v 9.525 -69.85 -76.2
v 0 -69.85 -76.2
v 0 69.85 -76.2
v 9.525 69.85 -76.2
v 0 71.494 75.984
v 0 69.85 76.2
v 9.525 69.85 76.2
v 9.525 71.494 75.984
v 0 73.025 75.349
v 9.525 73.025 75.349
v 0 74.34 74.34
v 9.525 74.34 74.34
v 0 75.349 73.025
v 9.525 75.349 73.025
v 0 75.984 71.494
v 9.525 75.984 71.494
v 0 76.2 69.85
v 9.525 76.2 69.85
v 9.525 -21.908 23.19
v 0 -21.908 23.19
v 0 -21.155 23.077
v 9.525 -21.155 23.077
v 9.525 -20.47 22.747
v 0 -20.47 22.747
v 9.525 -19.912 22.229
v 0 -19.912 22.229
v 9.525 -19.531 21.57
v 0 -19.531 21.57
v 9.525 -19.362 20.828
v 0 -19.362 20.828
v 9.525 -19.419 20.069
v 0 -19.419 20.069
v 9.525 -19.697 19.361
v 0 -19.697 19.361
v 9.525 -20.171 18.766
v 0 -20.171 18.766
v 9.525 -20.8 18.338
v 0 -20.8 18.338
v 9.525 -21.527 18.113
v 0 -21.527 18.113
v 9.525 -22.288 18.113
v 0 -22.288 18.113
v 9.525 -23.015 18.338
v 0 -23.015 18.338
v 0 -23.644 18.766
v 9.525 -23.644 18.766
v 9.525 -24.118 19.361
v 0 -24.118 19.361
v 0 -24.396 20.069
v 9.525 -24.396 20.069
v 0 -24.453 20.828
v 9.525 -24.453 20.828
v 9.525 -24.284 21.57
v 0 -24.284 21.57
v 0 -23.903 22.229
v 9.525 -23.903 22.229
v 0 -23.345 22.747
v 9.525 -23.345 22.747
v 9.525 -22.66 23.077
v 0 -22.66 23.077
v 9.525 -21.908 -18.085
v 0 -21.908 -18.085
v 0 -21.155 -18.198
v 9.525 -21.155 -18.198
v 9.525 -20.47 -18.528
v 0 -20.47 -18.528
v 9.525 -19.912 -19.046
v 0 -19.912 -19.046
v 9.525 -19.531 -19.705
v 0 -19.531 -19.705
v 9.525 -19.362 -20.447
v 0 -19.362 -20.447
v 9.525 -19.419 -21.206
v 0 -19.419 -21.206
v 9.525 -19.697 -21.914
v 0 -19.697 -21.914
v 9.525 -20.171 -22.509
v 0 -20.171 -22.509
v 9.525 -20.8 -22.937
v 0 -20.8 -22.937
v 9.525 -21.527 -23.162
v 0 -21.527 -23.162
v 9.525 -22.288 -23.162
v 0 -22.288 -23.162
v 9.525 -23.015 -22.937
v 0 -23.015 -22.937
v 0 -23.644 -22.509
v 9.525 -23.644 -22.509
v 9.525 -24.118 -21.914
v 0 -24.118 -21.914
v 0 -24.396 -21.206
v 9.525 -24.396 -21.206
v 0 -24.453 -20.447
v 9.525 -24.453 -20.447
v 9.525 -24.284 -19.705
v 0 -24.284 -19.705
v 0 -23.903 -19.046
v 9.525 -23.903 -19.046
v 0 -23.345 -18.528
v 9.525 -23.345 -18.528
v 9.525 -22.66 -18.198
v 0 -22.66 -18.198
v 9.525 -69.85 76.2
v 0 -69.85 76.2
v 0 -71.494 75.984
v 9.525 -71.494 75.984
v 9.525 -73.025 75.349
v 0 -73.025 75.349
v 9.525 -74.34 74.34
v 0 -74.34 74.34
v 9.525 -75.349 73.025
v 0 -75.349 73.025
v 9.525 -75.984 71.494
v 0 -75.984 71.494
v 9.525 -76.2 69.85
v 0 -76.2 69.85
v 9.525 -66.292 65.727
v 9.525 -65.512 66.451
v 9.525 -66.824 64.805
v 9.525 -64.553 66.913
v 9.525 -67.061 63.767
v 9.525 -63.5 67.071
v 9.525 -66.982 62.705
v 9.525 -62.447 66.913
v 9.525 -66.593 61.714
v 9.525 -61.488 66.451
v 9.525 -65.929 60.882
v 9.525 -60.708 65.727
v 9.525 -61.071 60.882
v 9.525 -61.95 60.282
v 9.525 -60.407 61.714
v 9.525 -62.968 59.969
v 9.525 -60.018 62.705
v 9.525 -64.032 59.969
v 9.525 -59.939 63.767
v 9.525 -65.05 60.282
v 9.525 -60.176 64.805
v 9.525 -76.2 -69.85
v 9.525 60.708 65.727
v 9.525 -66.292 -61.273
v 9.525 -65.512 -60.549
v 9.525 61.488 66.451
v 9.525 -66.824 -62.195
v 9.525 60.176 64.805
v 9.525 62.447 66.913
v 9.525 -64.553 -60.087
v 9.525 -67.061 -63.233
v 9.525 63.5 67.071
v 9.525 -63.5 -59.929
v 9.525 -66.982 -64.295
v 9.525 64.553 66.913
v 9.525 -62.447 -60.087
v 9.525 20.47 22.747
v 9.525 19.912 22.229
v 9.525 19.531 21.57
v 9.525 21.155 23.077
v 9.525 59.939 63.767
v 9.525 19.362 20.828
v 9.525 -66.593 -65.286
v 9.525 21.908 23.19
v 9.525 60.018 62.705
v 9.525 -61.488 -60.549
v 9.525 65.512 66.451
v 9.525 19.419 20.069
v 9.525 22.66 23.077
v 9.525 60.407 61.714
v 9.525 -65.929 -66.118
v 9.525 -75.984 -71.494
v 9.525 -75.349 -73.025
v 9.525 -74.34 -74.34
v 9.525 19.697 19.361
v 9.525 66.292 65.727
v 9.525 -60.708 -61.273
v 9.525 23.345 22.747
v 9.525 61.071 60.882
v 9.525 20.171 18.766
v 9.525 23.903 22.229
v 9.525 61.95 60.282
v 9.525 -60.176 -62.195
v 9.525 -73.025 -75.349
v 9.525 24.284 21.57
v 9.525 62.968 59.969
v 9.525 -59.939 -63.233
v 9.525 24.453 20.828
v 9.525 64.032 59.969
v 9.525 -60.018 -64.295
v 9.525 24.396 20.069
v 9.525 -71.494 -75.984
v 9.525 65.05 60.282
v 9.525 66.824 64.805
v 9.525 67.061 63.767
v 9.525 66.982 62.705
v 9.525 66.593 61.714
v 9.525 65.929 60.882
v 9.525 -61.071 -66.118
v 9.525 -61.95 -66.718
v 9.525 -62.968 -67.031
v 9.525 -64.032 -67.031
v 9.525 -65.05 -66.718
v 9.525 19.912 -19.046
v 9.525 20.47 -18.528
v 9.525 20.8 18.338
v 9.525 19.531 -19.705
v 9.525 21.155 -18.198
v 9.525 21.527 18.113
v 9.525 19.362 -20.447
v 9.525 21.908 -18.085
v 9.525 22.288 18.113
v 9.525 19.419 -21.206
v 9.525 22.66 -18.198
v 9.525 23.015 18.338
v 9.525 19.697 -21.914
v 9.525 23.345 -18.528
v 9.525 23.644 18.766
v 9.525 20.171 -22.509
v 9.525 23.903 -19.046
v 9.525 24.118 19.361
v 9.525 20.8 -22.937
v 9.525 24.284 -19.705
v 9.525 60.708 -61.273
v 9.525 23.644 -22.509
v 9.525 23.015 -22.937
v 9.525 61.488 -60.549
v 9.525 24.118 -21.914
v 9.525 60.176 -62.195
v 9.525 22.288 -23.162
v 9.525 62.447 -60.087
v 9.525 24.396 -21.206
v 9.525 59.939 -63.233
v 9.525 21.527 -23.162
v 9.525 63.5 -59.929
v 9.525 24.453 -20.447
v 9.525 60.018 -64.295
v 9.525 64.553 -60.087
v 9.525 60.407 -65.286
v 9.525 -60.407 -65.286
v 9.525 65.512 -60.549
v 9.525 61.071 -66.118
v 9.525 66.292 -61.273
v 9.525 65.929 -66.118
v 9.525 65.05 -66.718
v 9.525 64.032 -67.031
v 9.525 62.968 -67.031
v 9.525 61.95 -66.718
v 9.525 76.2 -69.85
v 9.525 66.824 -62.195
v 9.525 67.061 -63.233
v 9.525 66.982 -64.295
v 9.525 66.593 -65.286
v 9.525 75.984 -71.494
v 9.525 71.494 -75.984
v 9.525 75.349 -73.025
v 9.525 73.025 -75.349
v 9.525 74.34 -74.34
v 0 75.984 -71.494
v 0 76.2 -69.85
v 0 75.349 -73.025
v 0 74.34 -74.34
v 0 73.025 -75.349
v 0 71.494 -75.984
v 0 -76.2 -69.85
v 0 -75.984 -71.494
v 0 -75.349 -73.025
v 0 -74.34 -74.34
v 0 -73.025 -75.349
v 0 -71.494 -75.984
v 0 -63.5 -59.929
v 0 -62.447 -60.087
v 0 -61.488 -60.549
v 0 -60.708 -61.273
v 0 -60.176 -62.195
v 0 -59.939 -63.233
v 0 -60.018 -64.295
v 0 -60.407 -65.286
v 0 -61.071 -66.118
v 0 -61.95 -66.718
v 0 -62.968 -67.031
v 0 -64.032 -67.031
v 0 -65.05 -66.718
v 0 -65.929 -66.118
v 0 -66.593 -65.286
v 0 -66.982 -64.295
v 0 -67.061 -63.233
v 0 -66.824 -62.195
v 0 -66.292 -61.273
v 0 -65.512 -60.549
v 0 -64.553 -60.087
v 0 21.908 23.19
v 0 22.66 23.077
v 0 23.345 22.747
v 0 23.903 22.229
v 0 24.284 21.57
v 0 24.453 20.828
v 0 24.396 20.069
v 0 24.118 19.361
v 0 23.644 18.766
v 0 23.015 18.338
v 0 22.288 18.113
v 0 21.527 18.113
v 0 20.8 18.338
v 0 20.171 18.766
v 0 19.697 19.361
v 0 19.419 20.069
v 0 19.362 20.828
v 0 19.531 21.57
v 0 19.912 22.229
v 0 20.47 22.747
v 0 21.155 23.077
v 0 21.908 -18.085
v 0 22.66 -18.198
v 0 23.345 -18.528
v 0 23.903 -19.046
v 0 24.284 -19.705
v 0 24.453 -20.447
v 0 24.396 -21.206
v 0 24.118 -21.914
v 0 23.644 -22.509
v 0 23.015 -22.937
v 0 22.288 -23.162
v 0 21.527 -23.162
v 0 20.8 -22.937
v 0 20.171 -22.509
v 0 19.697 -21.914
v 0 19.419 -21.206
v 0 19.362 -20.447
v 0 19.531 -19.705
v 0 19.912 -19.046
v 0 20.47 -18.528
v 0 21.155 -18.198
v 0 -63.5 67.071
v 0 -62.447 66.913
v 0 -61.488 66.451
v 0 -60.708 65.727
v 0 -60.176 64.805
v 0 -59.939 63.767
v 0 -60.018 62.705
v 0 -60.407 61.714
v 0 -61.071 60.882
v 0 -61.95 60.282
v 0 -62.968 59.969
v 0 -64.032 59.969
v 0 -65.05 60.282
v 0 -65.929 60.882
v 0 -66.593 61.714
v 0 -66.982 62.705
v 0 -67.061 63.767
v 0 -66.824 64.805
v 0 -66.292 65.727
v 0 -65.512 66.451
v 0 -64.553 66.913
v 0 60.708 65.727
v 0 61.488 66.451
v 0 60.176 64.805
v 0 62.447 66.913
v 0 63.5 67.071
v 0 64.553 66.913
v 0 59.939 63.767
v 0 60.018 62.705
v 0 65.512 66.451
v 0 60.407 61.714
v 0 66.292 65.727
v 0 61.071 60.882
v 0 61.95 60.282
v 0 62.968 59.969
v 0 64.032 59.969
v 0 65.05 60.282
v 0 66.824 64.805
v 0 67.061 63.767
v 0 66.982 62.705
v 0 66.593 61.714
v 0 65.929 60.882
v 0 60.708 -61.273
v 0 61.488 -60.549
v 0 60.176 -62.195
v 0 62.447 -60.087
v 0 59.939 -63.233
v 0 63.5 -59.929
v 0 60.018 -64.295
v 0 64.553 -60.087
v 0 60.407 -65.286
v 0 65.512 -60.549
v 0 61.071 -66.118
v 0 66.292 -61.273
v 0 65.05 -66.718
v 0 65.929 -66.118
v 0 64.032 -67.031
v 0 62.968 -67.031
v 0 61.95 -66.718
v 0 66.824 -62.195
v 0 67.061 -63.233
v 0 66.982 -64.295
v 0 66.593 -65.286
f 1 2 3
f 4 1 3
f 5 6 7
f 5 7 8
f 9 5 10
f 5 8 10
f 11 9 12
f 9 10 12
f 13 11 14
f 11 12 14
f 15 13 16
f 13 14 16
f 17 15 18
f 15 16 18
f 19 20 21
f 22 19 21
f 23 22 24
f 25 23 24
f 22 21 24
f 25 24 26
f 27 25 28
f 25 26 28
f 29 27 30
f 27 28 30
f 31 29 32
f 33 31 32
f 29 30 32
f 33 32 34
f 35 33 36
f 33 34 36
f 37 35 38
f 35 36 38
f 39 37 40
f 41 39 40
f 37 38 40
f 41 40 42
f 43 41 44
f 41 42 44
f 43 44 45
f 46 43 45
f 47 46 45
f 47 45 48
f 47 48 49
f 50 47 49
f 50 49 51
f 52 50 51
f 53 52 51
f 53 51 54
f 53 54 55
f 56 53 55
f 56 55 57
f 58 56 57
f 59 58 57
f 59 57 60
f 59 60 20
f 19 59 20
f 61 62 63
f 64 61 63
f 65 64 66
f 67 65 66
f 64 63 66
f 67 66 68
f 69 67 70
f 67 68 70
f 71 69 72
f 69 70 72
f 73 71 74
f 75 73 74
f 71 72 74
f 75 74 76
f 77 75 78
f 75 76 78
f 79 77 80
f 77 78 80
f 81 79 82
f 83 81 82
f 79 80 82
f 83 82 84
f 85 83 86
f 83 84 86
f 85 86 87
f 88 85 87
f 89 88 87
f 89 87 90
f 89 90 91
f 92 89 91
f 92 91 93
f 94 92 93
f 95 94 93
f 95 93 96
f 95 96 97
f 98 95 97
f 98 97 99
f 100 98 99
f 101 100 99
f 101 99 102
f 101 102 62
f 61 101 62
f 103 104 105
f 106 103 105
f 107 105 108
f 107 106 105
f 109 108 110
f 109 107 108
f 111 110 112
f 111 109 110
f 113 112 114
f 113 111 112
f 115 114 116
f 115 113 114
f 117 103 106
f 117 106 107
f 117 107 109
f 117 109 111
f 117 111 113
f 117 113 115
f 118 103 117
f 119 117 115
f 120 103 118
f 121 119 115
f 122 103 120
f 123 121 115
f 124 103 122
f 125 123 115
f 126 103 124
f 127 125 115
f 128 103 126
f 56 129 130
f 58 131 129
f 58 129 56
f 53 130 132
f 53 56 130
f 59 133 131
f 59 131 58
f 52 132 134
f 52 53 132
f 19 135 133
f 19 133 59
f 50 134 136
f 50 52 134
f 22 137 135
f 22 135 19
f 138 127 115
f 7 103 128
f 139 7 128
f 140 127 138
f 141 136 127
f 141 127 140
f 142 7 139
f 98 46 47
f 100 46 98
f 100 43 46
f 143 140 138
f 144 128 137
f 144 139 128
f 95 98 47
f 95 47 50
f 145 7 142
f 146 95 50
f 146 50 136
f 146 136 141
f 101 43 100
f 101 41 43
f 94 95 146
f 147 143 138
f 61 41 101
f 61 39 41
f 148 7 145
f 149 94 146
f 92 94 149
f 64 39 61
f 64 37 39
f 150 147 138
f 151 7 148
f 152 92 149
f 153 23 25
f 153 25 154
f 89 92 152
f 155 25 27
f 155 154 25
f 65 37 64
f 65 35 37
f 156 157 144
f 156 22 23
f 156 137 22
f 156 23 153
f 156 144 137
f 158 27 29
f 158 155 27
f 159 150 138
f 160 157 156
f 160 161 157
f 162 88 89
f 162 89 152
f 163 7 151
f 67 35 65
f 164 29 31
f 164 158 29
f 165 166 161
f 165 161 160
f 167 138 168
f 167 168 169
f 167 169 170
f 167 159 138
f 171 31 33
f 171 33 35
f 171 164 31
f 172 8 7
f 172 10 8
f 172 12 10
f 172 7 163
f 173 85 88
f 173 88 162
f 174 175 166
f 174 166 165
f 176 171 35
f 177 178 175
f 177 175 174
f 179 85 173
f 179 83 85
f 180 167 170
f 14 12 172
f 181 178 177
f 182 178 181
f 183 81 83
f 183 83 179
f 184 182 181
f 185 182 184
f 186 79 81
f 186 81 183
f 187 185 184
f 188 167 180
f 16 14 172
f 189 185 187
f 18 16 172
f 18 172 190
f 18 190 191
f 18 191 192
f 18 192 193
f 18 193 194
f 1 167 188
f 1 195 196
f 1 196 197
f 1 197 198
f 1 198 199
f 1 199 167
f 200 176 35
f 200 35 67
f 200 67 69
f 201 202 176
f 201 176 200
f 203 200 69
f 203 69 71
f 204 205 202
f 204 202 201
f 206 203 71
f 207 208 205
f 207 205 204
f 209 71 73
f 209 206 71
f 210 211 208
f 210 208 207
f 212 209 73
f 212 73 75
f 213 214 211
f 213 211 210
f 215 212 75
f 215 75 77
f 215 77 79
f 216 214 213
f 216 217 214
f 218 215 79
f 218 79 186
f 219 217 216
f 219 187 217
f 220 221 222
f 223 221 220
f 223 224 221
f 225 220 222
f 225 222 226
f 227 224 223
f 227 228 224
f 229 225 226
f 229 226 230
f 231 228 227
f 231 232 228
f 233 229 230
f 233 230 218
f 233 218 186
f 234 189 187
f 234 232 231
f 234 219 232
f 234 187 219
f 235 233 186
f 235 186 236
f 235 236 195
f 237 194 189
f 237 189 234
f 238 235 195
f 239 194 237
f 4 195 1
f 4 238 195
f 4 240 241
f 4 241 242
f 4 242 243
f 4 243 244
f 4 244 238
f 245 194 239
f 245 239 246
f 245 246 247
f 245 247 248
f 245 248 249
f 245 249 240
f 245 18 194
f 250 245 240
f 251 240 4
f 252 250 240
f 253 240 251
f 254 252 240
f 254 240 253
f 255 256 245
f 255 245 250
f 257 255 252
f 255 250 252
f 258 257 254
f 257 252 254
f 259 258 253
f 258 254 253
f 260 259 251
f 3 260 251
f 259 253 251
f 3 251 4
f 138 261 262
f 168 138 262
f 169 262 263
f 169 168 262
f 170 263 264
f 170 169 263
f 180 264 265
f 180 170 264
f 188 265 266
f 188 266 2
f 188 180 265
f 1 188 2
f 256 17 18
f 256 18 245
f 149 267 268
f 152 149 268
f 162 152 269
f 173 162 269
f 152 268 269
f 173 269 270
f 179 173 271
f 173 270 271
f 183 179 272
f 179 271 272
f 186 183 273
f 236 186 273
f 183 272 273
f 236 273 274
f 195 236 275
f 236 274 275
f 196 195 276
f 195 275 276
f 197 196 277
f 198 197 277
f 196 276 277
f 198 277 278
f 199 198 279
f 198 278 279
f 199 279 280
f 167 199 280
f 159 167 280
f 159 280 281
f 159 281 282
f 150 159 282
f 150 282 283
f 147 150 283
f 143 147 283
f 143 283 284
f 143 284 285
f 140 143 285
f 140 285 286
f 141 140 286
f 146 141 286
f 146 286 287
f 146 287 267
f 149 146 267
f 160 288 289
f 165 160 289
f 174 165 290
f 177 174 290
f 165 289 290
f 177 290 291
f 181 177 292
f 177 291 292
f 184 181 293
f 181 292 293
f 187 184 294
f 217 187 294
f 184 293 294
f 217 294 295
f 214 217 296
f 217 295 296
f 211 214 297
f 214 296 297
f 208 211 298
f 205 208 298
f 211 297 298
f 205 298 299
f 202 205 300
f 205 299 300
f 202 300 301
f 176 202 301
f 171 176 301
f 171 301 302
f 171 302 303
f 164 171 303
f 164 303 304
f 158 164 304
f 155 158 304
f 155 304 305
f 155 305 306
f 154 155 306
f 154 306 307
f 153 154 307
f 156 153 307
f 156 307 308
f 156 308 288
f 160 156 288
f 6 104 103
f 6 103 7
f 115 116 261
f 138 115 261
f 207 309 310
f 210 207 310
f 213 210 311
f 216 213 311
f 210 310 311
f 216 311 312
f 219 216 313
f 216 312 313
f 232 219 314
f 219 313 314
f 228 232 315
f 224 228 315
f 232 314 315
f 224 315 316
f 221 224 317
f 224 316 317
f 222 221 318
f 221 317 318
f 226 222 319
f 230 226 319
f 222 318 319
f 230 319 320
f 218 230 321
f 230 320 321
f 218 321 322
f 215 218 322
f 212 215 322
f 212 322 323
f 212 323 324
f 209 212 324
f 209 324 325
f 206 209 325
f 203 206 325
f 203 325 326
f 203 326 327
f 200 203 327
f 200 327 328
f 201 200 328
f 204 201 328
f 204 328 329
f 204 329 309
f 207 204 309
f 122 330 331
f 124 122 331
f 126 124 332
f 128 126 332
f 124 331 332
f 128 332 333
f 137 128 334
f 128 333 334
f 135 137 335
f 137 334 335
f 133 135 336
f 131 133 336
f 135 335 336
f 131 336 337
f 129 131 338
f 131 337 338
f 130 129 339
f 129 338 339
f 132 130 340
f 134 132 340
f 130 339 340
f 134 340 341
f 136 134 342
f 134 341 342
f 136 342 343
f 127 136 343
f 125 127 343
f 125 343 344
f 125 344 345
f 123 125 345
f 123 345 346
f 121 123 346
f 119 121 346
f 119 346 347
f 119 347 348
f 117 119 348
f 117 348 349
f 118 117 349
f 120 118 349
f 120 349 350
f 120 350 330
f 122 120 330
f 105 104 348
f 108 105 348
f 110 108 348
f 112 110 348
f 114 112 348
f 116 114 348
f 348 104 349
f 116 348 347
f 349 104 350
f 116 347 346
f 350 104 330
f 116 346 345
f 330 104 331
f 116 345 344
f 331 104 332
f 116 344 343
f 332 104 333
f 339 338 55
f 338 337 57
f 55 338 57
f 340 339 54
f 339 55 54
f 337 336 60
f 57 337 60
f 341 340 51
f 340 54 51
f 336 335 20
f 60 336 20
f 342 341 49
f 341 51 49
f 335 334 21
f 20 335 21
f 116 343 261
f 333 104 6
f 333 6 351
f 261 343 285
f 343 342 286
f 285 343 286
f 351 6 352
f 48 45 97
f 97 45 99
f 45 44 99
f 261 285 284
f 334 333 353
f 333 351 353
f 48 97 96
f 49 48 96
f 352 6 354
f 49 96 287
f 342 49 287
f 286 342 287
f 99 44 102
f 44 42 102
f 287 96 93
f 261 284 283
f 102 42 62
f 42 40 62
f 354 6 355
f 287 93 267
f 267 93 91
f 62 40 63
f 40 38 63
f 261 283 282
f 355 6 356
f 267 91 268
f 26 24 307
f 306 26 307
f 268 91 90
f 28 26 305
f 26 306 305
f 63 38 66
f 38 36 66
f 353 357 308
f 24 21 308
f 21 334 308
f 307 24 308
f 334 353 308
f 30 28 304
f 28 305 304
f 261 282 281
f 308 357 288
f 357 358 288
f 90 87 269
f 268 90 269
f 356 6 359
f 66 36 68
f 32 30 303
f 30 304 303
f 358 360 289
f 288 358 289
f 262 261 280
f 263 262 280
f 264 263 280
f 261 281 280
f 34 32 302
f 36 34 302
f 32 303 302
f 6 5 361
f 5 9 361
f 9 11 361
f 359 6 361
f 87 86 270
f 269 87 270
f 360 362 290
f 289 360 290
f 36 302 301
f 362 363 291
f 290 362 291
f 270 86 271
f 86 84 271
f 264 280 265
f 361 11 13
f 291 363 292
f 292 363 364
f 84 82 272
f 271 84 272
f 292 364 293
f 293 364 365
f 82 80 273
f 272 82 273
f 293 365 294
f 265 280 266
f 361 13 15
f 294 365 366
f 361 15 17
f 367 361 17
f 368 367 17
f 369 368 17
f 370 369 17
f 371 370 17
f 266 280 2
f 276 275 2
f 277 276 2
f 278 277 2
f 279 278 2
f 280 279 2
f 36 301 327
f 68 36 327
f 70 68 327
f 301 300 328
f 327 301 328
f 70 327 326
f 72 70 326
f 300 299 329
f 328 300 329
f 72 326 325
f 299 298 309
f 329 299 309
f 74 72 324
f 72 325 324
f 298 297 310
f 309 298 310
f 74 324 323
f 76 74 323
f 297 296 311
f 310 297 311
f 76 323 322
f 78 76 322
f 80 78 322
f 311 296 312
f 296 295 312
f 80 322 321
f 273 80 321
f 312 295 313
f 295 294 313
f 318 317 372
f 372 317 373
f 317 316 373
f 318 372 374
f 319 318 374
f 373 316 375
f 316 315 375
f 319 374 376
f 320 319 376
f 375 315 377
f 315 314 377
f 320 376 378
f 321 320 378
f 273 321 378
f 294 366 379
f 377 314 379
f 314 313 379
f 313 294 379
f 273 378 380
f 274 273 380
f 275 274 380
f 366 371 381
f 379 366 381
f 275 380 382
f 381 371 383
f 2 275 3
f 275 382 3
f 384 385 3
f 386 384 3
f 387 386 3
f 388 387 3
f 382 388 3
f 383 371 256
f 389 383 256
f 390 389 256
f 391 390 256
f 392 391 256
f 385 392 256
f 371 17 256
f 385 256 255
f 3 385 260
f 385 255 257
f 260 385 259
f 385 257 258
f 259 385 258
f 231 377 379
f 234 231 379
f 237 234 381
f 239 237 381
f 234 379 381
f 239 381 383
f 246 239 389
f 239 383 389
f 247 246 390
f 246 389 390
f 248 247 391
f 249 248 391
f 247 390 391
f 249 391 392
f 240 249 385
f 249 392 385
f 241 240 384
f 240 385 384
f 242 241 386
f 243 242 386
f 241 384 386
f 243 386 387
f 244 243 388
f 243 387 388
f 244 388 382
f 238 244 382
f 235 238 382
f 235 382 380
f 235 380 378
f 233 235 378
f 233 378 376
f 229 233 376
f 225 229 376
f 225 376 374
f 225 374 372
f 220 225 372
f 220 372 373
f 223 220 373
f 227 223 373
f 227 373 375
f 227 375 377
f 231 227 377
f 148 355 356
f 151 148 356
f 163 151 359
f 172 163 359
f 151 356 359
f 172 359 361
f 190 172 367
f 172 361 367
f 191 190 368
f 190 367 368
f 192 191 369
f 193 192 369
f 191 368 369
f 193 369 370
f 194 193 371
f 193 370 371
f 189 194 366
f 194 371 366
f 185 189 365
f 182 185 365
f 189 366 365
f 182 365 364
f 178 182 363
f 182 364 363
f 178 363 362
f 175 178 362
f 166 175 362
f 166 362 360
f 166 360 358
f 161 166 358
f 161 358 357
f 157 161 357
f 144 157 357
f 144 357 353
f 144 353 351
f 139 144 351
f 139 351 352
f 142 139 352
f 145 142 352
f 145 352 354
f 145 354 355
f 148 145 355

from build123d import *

# Parameters (mm, degrees)
SKETCH1_W               = 152.4
SKETCH1_H               = 152.4
BOSS_EXTRUDE1_DEPTH     = 9.525
F_1_4_20_TAPPED_HOLE1_D = 5.1054
FILLET1_R               = 6.35
F_1_4_CLEARANCE_HOLE1_D = 7.14248


with BuildPart() as part:
    # Sketch1 → Boss-Extrude1 (new body)
    with BuildSketch(Plane(origin=(0, 0, 0), x_dir=(0, 0, -1), z_dir=(1, 0, 0))):
        Rectangle(SKETCH1_W, SKETCH1_H)
    extrude(amount=BOSS_EXTRUDE1_DEPTH)

    # 1/4-20 Tapped Hole1 (through all)
    with Locations(Plane(origin=(9.525, 0, 0), x_dir=(0, 0, -1), z_dir=(1, 0, 0))):
        with Locations((-20.6375, 21.9075), (20.6375, 21.9075), (20.6375, -21.9075), (-20.6375, -21.9075)):
            Hole(F_1_4_20_TAPPED_HOLE1_D / 2)

    # Fillet1
    fillet1_edges = [part.edges().sort_by_distance(p)[0] for p in [
        (4.7625, -76.2, -76.2),
        (4.7625, -76.2, 76.2),
        (4.7625, 76.2, 76.2),
        (4.7625, 76.2, -76.2),
    ]]
    fillet(fillet1_edges, radius=FILLET1_R)

    # 1/4 Clearance Hole1 (through all)
    with Locations(Plane(origin=(9.525, 0, 0), x_dir=(0, 0, -1), z_dir=(1, 0, 0))):
        with Locations((-63.5, 63.5), (63.5, 63.5), (63.5, -63.5), (-63.5, -63.5)):
            Hole(F_1_4_CLEARANCE_HOLE1_D / 2)


solid = part.part
